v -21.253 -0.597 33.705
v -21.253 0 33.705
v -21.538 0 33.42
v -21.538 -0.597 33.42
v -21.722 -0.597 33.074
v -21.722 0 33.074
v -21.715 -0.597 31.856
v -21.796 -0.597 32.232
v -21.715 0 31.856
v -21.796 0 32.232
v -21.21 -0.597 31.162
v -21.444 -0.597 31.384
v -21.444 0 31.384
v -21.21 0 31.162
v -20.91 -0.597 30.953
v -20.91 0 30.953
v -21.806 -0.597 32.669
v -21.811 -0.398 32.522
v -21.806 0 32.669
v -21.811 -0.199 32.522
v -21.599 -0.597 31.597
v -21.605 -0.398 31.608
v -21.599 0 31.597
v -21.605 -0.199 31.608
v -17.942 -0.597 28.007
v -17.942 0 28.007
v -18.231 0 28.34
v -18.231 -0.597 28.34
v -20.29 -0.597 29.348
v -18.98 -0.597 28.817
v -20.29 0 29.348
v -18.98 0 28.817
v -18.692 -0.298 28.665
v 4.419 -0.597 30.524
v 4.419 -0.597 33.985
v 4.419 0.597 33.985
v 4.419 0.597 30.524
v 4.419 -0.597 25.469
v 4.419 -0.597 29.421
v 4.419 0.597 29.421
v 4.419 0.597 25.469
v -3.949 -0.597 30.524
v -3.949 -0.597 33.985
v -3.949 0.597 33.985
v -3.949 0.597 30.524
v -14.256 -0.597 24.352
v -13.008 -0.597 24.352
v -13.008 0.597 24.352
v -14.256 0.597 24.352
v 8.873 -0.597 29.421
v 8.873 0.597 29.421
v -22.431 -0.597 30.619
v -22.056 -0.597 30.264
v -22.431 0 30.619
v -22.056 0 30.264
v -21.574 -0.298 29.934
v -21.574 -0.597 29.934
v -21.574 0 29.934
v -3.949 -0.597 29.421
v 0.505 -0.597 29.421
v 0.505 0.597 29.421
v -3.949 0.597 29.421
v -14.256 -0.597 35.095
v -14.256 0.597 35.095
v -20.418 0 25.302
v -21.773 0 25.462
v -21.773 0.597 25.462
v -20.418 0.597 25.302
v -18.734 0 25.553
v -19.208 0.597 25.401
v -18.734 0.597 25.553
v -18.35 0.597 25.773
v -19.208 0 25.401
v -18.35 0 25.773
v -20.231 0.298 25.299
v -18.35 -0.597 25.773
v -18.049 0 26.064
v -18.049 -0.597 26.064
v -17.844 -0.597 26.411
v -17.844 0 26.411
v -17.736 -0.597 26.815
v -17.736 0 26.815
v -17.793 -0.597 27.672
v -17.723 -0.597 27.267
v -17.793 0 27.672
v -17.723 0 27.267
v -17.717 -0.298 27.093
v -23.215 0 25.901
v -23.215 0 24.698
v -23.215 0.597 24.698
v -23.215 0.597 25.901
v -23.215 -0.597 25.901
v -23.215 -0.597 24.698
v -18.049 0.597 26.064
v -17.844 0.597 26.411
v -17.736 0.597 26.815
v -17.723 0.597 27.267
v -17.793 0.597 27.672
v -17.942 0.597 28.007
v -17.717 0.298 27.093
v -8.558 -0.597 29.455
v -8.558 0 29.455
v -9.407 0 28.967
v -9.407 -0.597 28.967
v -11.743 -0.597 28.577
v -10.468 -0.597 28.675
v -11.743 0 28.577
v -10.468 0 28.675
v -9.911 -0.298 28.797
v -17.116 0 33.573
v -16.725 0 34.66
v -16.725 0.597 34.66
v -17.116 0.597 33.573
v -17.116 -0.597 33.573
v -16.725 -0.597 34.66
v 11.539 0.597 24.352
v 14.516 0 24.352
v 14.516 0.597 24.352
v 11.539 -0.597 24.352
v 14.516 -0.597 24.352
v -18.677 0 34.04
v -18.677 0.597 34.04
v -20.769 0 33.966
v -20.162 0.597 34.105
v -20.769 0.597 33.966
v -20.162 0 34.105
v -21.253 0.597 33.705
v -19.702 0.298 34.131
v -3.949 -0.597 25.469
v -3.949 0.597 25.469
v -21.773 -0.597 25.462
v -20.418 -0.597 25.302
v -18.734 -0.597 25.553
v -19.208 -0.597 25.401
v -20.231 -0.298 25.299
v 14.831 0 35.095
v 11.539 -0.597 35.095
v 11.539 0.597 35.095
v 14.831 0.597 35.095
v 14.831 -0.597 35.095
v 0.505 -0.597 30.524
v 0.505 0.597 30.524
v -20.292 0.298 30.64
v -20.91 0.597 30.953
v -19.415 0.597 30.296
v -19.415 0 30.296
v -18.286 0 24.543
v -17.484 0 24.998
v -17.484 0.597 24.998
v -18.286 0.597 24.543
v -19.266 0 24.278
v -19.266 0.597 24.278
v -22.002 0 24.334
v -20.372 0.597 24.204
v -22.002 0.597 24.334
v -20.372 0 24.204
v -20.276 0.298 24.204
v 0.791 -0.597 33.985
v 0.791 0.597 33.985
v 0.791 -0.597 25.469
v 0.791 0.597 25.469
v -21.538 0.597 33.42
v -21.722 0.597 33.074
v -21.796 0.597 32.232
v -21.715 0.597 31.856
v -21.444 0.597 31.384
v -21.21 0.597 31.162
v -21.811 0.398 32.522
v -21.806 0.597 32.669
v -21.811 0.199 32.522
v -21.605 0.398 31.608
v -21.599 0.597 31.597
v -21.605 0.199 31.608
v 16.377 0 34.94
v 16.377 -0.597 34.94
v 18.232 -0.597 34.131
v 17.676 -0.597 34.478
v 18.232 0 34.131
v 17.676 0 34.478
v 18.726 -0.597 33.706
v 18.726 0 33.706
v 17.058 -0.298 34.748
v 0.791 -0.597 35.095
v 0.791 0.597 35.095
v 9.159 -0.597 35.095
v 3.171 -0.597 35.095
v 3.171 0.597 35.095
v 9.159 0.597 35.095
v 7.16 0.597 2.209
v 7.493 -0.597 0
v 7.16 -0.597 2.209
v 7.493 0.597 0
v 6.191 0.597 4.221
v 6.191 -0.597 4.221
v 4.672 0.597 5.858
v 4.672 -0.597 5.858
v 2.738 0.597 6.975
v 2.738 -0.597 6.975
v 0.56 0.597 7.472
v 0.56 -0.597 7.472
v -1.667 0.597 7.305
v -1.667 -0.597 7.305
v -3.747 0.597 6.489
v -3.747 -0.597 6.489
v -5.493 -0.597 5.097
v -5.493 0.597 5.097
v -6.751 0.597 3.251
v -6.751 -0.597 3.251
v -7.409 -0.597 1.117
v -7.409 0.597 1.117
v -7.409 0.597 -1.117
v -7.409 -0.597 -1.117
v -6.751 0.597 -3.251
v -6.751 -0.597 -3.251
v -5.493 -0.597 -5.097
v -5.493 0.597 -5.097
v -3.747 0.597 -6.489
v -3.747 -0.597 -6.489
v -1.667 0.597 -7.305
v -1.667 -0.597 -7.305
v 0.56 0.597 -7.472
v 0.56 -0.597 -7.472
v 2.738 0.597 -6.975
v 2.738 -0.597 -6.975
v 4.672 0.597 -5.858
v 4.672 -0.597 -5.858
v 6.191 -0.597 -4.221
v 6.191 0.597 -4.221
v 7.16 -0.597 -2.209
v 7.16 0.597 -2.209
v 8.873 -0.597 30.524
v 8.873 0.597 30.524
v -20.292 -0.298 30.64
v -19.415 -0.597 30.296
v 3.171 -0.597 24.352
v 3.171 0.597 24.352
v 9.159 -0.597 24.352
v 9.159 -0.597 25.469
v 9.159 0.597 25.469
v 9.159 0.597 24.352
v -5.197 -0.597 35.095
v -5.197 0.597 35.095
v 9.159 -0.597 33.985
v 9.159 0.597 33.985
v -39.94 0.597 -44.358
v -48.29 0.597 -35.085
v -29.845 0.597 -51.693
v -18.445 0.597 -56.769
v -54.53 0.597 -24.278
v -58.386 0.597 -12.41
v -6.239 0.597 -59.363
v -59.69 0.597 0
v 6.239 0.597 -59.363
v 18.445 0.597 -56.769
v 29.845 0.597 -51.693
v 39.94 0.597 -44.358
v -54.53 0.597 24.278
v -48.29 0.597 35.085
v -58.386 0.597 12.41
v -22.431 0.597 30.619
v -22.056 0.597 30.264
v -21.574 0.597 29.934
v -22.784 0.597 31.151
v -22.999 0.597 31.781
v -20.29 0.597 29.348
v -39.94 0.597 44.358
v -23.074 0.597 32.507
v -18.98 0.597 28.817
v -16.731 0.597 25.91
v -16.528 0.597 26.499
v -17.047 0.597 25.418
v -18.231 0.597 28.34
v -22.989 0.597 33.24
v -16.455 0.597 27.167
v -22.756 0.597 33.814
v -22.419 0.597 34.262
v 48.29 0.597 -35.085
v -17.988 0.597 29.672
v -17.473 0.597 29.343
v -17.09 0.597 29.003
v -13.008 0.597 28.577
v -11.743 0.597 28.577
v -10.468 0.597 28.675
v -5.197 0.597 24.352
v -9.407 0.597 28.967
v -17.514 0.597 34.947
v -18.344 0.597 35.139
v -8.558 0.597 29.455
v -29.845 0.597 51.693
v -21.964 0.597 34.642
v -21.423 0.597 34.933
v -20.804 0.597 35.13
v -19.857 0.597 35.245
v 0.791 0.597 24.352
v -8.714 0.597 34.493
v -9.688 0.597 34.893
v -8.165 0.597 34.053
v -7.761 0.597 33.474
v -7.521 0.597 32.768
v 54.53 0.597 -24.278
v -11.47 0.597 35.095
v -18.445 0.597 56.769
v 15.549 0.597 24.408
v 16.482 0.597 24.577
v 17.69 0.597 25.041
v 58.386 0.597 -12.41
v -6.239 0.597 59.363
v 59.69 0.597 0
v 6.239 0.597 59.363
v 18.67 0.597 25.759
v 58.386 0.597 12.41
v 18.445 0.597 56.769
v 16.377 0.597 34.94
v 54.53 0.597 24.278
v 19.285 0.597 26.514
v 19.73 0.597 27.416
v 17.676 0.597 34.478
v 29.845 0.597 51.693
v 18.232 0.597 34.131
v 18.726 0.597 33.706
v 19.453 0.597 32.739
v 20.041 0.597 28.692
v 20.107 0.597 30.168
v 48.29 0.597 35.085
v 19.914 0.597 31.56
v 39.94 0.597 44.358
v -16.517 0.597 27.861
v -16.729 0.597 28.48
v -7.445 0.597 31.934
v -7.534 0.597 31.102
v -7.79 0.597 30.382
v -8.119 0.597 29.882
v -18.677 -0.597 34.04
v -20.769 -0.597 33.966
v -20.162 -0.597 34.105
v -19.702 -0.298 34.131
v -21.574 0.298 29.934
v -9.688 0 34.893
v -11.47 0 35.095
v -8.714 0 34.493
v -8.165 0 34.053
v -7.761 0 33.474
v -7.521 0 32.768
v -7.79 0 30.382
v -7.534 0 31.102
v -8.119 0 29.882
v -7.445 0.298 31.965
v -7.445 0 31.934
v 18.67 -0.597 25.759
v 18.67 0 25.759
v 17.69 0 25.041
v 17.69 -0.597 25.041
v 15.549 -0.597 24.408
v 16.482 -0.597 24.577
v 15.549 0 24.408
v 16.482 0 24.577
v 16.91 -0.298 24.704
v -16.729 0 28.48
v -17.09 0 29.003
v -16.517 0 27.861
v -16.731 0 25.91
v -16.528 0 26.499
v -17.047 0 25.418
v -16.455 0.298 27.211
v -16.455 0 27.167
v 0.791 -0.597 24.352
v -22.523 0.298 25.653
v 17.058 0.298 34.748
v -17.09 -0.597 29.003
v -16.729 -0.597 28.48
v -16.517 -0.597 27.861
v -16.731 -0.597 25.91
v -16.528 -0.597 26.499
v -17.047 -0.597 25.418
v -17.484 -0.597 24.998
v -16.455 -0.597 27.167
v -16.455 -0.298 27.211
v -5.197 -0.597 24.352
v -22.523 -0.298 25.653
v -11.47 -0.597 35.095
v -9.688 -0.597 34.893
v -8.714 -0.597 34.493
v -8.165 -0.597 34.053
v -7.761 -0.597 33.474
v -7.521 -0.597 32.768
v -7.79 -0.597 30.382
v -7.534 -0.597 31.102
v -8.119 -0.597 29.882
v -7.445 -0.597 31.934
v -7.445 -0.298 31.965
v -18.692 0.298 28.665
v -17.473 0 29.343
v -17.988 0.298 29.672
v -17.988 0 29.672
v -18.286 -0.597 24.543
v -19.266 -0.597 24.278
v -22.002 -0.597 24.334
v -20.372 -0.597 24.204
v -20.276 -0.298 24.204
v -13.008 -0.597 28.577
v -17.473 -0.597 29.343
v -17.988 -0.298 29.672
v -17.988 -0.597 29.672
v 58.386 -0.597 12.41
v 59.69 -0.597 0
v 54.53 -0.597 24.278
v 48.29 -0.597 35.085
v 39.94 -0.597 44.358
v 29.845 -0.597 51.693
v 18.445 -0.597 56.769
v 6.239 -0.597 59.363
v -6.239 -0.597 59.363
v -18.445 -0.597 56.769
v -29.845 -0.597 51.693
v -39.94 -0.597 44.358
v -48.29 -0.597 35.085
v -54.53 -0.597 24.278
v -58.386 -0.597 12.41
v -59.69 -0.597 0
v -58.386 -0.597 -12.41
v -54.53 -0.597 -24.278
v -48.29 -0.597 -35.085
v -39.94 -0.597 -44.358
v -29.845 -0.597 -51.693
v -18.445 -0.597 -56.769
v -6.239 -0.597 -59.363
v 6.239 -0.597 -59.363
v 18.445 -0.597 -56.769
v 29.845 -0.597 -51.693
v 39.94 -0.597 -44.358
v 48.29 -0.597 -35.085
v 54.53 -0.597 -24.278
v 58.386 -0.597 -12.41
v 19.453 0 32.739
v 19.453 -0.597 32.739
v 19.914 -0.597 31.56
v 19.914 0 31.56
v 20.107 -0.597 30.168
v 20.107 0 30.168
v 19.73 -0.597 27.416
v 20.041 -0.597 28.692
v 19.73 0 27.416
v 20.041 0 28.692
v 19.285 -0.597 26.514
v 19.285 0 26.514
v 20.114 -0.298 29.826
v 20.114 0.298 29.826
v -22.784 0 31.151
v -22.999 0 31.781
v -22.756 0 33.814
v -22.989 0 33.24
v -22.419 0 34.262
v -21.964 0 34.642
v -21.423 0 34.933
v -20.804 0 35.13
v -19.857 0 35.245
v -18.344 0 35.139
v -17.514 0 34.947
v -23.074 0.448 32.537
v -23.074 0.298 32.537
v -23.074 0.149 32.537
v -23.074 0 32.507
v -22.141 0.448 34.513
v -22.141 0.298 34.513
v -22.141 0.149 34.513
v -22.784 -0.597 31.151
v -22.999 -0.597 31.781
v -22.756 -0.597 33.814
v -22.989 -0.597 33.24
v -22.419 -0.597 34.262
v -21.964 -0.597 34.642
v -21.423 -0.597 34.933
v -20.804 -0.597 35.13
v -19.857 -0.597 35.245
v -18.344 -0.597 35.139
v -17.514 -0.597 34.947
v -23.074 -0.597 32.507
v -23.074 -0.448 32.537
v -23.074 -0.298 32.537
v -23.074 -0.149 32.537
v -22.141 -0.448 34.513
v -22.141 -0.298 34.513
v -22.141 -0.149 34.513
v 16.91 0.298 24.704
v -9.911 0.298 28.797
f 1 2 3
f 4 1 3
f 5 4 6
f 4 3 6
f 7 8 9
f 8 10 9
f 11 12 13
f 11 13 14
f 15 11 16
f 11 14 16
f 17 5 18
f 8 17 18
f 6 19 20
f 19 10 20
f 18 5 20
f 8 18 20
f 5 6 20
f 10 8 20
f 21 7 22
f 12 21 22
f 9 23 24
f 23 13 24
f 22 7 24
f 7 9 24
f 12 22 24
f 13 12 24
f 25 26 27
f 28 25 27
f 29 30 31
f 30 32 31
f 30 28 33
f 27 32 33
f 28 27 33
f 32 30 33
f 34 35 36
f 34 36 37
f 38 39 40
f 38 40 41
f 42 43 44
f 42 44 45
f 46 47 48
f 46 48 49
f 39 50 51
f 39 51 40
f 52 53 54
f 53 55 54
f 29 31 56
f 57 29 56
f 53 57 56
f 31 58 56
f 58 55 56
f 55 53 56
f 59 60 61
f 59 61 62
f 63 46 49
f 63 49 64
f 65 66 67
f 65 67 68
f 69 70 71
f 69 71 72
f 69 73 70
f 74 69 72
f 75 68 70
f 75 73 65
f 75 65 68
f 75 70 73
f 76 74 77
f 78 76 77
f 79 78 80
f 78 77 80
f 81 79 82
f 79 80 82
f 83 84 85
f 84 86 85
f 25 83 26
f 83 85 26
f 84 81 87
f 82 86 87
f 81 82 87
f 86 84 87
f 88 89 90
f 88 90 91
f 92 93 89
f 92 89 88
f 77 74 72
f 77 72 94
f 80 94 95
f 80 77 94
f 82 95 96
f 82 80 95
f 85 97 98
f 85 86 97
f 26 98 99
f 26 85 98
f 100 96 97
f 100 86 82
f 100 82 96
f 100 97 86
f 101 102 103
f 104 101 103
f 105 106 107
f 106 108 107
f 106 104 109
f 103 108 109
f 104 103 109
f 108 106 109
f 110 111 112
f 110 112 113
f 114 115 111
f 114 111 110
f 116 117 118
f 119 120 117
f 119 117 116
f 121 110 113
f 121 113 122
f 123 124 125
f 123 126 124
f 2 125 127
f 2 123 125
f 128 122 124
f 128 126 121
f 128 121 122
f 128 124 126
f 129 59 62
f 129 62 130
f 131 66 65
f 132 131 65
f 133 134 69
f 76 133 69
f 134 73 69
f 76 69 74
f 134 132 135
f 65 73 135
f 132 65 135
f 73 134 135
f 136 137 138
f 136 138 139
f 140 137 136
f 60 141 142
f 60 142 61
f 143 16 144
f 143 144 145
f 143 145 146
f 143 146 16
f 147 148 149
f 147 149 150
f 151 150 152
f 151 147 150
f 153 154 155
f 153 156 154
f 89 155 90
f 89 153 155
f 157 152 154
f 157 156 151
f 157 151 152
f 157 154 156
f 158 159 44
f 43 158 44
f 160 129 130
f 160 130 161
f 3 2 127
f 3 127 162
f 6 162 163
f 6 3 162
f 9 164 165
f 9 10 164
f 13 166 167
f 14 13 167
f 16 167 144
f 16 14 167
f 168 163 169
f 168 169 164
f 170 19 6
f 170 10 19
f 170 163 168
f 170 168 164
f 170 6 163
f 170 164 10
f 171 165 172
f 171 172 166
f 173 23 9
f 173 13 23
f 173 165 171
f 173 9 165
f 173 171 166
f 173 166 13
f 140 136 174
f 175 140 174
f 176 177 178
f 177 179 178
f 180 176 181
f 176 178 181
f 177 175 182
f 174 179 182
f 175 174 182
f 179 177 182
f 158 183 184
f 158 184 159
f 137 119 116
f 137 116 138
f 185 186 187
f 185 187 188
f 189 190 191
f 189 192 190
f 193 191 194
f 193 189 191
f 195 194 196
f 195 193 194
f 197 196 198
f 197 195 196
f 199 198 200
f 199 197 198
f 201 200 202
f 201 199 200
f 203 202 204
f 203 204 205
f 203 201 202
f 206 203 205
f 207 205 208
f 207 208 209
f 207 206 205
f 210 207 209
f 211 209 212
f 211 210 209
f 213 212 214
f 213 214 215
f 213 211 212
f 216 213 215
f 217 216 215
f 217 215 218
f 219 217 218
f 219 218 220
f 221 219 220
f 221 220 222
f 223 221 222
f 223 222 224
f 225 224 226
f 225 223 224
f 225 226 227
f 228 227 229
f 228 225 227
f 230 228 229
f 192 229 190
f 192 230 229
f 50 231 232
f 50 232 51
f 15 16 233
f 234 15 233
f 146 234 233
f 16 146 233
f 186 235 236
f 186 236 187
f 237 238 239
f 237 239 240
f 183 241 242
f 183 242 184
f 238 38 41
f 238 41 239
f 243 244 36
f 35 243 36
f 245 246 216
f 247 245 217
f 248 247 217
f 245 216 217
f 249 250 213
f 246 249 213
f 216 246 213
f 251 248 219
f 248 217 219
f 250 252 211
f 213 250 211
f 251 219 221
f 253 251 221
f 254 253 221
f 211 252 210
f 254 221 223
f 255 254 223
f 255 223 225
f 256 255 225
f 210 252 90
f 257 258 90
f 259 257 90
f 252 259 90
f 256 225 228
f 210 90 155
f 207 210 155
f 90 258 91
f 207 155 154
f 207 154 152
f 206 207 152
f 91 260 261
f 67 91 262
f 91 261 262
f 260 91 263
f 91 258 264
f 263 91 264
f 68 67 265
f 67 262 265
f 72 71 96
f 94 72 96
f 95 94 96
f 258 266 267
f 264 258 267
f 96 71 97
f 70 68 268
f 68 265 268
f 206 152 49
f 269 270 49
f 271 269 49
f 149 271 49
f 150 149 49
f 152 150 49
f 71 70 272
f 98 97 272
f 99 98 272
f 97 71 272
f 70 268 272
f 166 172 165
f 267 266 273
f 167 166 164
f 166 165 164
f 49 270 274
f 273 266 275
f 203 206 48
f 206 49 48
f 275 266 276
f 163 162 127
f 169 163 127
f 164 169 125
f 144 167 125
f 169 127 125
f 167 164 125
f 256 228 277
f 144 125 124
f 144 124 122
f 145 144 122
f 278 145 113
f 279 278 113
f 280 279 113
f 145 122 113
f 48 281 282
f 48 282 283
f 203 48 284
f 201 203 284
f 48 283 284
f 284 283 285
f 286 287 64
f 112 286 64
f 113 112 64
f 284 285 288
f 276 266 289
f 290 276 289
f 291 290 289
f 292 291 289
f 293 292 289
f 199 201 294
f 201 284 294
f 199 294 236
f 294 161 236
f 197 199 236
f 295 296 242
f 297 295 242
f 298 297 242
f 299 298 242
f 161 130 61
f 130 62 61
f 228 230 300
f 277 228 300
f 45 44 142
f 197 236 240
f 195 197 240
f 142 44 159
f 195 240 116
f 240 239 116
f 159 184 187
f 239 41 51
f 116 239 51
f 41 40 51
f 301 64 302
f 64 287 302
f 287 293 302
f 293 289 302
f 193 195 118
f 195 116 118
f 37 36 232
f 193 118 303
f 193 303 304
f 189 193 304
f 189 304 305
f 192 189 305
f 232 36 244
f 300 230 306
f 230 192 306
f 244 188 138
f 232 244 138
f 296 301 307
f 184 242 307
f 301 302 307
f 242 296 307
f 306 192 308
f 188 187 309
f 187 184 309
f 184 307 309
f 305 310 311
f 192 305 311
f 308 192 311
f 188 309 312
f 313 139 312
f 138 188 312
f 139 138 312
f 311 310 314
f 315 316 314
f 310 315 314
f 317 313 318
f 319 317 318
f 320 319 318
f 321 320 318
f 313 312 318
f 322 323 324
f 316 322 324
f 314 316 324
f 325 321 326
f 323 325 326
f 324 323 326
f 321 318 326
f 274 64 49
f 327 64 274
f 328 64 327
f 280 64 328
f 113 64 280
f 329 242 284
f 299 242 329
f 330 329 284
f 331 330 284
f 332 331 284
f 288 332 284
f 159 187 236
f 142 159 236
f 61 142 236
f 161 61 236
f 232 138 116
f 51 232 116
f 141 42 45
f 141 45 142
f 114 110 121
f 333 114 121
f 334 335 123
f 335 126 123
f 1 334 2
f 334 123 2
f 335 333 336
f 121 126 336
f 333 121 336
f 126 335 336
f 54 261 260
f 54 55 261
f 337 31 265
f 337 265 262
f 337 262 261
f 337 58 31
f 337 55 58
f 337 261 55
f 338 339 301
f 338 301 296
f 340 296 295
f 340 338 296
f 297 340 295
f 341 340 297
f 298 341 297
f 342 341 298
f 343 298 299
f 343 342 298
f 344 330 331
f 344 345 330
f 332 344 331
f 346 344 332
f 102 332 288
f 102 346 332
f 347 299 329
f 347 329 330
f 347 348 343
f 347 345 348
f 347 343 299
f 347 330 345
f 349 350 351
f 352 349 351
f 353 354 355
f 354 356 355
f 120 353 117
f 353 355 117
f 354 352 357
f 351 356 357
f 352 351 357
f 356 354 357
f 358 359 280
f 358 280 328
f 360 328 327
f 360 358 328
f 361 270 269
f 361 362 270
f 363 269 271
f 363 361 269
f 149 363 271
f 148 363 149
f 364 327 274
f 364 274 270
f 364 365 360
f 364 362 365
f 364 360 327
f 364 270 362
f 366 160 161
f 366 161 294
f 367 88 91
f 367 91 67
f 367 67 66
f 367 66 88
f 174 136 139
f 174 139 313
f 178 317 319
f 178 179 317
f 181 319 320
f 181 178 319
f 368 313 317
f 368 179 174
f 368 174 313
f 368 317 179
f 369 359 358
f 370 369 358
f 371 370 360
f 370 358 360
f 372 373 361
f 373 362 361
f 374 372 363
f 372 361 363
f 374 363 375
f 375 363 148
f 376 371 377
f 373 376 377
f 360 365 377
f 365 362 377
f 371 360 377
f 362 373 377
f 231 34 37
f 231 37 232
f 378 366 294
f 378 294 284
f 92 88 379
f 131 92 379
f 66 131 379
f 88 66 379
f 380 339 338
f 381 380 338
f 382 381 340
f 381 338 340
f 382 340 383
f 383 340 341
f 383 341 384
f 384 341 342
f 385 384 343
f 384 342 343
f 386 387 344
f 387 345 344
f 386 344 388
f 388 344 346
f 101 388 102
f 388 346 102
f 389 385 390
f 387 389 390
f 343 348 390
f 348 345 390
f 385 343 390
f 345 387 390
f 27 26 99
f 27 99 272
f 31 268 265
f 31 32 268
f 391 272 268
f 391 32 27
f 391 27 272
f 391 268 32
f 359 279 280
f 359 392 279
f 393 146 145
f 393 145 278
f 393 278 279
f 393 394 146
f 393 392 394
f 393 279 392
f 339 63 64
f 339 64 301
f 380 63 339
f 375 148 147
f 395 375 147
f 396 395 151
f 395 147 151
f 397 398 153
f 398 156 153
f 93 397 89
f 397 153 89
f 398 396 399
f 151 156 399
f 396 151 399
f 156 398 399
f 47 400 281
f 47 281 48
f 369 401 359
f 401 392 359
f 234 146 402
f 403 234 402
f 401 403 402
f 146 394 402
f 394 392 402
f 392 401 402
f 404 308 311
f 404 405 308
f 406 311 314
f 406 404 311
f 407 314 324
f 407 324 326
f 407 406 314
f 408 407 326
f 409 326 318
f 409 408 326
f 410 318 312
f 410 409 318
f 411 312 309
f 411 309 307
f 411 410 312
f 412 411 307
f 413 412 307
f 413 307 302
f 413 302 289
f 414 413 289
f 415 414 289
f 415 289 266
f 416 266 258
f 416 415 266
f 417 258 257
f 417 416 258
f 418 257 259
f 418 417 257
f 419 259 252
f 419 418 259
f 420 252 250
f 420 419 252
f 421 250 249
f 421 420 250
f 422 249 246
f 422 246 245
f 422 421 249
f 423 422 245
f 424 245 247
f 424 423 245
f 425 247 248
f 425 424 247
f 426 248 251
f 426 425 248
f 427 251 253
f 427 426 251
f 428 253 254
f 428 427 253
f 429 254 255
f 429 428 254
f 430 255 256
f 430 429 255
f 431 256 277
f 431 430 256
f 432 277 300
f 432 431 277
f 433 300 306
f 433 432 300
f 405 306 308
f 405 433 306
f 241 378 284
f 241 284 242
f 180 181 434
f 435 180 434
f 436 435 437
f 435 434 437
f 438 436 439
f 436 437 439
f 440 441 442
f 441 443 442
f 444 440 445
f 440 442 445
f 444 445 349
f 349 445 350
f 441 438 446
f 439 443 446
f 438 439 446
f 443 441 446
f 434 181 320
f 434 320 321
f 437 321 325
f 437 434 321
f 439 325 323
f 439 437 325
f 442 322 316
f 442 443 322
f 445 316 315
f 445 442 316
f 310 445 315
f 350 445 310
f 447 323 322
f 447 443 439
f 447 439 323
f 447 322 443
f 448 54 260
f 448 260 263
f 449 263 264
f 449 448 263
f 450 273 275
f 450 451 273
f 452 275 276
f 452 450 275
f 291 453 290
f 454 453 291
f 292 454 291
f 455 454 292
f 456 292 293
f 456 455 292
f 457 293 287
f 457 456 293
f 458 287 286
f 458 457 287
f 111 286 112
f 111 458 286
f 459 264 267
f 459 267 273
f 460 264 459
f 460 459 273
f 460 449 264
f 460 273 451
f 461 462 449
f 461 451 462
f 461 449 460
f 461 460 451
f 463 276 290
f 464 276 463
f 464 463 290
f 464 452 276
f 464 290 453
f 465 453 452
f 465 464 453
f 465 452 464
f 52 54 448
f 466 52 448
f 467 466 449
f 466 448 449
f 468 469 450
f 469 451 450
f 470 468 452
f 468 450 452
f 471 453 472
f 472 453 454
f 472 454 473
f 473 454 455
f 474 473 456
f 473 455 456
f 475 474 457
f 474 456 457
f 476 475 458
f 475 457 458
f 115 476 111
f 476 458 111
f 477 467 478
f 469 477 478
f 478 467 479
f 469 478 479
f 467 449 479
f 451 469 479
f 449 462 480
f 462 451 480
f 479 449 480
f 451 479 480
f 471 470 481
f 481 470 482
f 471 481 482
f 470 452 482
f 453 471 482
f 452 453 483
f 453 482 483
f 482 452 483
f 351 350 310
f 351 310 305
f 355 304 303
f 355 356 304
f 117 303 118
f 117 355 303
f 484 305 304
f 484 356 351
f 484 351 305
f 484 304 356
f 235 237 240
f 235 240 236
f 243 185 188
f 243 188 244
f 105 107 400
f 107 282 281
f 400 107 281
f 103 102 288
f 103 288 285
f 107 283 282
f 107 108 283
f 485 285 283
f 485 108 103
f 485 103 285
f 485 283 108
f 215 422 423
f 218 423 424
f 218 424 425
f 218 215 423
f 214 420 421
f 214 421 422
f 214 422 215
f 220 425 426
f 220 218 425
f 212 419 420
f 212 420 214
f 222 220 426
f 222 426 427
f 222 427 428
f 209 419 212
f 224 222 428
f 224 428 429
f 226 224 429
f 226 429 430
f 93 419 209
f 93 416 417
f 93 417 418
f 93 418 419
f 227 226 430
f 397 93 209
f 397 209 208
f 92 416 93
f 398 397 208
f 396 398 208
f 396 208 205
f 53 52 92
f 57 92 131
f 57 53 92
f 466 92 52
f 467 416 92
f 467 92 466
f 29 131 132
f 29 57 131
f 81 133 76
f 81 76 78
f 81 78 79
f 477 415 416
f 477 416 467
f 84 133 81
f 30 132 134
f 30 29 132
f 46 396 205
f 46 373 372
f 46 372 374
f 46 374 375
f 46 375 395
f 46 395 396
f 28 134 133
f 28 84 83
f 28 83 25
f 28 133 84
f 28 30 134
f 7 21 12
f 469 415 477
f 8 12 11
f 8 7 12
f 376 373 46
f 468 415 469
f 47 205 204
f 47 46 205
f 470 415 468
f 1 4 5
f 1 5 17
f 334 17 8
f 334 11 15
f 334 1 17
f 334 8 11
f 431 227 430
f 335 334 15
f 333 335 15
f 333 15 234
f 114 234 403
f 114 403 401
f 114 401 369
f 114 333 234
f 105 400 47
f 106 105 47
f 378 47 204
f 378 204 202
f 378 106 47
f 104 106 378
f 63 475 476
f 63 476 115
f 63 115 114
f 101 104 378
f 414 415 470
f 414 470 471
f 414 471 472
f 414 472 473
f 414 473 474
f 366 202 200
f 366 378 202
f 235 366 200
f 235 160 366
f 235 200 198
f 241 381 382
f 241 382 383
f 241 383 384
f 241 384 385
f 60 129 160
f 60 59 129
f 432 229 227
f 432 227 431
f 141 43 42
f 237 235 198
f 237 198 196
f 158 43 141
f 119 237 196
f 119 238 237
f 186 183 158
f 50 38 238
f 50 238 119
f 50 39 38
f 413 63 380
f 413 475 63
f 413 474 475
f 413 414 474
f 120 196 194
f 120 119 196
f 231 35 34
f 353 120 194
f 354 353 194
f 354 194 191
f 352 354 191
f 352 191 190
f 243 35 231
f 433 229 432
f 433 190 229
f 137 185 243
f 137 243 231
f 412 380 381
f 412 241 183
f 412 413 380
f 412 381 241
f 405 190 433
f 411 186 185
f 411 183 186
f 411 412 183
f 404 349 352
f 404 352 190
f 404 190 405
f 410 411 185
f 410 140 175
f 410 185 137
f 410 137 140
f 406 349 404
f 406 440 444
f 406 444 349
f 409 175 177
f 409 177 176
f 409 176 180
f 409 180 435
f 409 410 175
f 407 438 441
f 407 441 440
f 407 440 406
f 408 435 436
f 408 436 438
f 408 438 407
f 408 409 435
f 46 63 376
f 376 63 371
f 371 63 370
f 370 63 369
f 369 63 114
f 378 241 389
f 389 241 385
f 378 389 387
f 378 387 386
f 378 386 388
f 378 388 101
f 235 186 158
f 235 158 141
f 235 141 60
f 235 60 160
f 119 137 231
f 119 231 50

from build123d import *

# Parameters (mm, degrees)
F0_R     = 59.69
F0_R_2   = 7.493
F1_DEPTH = 0.5969


with BuildPart() as f1:
    # F0 (on Front) → F1 (new body, symmetric)
    with BuildSketch(Plane.XZ):
        Circle(F0_R)
        with BuildLine():
            add(Edge.make_bspline(
                [(-17.0897103089, 29.0026352959), (-16.4548764224, 28.3113717305), (-16.4548764224, 27.2109929938)],
                knots=[0, 0, 0, 1, 1, 1], degree=2))
            add(Edge.make_bspline(
                [(-16.4548764224, 27.2109929938), (-16.4548764224, 25.7931973138), (-17.4835424423, 24.9984793372)],
                knots=[0, 0, 0, 1, 1, 1], degree=2))
            add(Edge.make_bspline(
                [(-17.4835424423, 24.9984793372), (-18.5122084622, 24.2037613607), (-20.2756359249, 24.2037613607)],
                knots=[0, 0, 0, 1, 1, 1], degree=2))
            add(Edge.make_bspline(
                [(-20.2756359249, 24.2037613607), (-22.1848400579, 24.2037613607), (-23.2146816961, 24.6975210503)],
                knots=[0, 0, 0, 1, 1, 1], degree=2))
            Line((-23.2146816961, 24.6975210503), (-23.2146816961, 25.9013541981))
            add(Edge.make_bspline(
                [(-23.2146816961, 25.9013541981), (-22.5516329701, 25.6239082773), (-21.7733736499, 25.4616729508)],
                knots=[0, 0, 0, 1, 1, 1], degree=2))
            add(Edge.make_bspline(
                [(-21.7733736499, 25.4616729508), (-20.9951143297, 25.2994376242), (-20.2309624292, 25.2994376242)],
                knots=[0, 0, 0, 1, 1, 1], degree=2))
            add(Edge.make_bspline(
                [(-20.2309624292, 25.2994376242), (-18.9824557856, 25.2994376242), (-18.3499731356, 25.7732118025)],
                knots=[0, 0, 0, 1, 1, 1], degree=2))
            add(Edge.make_bspline(
                [(-18.3499731356, 25.7732118025), (-17.7174904857, 26.2469859808), (-17.7174904857, 27.0934311629)],
                knots=[0, 0, 0, 1, 1, 1], degree=2))
            add(Edge.make_bspline(
                [(-17.7174904857, 27.0934311629), (-17.7174904857, 27.6506742412), (-17.9420335826, 28.0068865886)],
                knots=[0, 0, 0, 1, 1, 1], degree=2))
            add(Edge.make_bspline(
                [(-17.9420335826, 28.0068865886), (-18.1665766795, 28.3630989361), (-18.6920780634, 28.6652328414)],
                knots=[0, 0, 0, 1, 1, 1], degree=2))
            add(Edge.make_bspline(
                [(-18.6920780634, 28.6652328414), (-19.2175794473, 28.9673667467), (-20.2897433446, 29.3482670786)],
                knots=[0, 0, 0, 1, 1, 1], degree=2))
            add(Edge.make_bspline(
                [(-20.2897433446, 29.3482670786), (-21.7874810696, 29.8843490273), (-22.4305442844, 30.6191104701)],
                knots=[0, 0, 0, 1, 1, 1], degree=2))
            add(Edge.make_bspline(
                [(-22.4305442844, 30.6191104701), (-23.0736074991, 31.3538719129), (-23.0736074991, 32.5365439312)],
                knots=[0, 0, 0, 1, 1, 1], degree=2))
            add(Edge.make_bspline(
                [(-23.0736074991, 32.5365439312), (-23.0736074991, 33.777996865), (-22.1413421805, 34.5127583078)],
                knots=[0, 0, 0, 1, 1, 1], degree=2))
            add(Edge.make_bspline(
                [(-22.1413421805, 34.5127583078), (-21.2090768619, 35.2475197506), (-19.6713681144, 35.2475197506)],
                knots=[0, 0, 0, 1, 1, 1], degree=2))
            add(Edge.make_bspline(
                [(-19.6713681144, 35.2475197506), (-18.0701759782, 35.2475197506), (-16.7252686333, 34.6597105963)],
                knots=[0, 0, 0, 1, 1, 1], degree=2))
            Line((-16.7252686333, 34.6597105963), (-17.1155739117, 33.5734392793))
            add(Edge.make_bspline(
                [(-17.1155739117, 33.5734392793), (-18.4463738369, 34.1306823575), (-19.7019341904, 34.1306823575)],
                knots=[0, 0, 0, 1, 1, 1], degree=2))
            add(Edge.make_bspline(
                [(-19.7019341904, 34.1306823575), (-20.6941560427, 34.1306823575), (-21.2525747393, 33.7051085298)],
                knots=[0, 0, 0, 1, 1, 1], degree=2))
            add(Edge.make_bspline(
                [(-21.2525747393, 33.7051085298), (-21.8109934358, 33.2795347022), (-21.8109934358, 32.5224365115)],
                knots=[0, 0, 0, 1, 1, 1], degree=2))
            add(Edge.make_bspline(
                [(-21.8109934358, 32.5224365115), (-21.8109934358, 31.9651934333), (-21.6052602318, 31.6078054675)],
                knots=[0, 0, 0, 1, 1, 1], degree=2))
            add(Edge.make_bspline(
                [(-21.6052602318, 31.6078054675), (-21.3995270278, 31.2504175017), (-20.9104698115, 30.9529860697)],
                knots=[0, 0, 0, 1, 1, 1], degree=2))
            add(Edge.make_bspline(
                [(-20.9104698115, 30.9529860697), (-20.4214125952, 30.6555546376), (-19.4150833231, 30.2958154352)],
                knots=[0, 0, 0, 1, 1, 1], degree=2))
            add(Edge.make_bspline(
                [(-19.4150833231, 30.2958154352), (-17.7245441955, 29.6938988613), (-17.0897103089, 29.0026352959)],
                knots=[0, 0, 0, 1, 1, 1], degree=2))
        make_face(mode=Mode.SUBTRACT)
        with BuildLine():
            add(Edge.make_bspline(
                [(-11.4702547944, 35.0946893705), (-7.4449377062, 35.0946893705), (-7.4449377062, 31.9651934333)],
                knots=[0, 0, 0, 1, 1, 1], degree=2))
            add(Edge.make_bspline(
                [(-7.4449377062, 31.9651934333), (-7.4449377062, 30.3334352211), (-8.5582482443, 29.4552483447)],
                knots=[0, 0, 0, 1, 1, 1], degree=2))
            add(Edge.make_bspline(
                [(-8.5582482443, 29.4552483447), (-9.6715587824, 28.5770614682), (-11.742998242, 28.5770614682)],
                knots=[0, 0, 0, 1, 1, 1], degree=2))
            Line((-11.742998242, 28.5770614682), (-13.0079635419, 28.5770614682))
            Line((-13.0079635419, 28.5770614682), (-13.0079635419, 24.3518892676))
            Line((-13.0079635419, 24.3518892676), (-14.2564701855, 24.3518892676))
            Line((-14.2564701855, 24.3518892676), (-14.2564701855, 35.0946893705))
            Line((-14.2564701855, 35.0946893705), (-11.4702547944, 35.0946893705))
        make_face(mode=Mode.SUBTRACT)
        Polygon((0.791444163, 25.4687266606), (0.791444163, 24.3518892676), (-5.1971555004, 24.3518892676), (-5.1971555004, 35.0946893705), (0.791444163, 35.0946893705), (0.791444163, 33.9849056872), (-3.9486488567, 33.9849056872), (-3.9486488567, 30.5238853871), (0.5045932958, 30.5238853871), (0.5045932958, 29.4211554137), (-3.9486488567, 29.4211554137), (-3.9486488567, 25.4687266606), align=None, mode=Mode.SUBTRACT)
        Circle(F0_R_2, mode=Mode.SUBTRACT)
        Polygon((9.1594952828, 25.4687266606), (9.1594952828, 24.3518892676), (3.1708956194, 24.3518892676), (3.1708956194, 35.0946893705), (9.1594952828, 35.0946893705), (9.1594952828, 33.9849056872), (4.419402263, 33.9849056872), (4.419402263, 30.5238853871), (8.8726444155, 30.5238853871), (8.8726444155, 29.4211554137), (4.419402263, 29.4211554137), (4.419402263, 25.4687266606), align=None, mode=Mode.SUBTRACT)
        with BuildLine():
            add(Edge.make_bspline(
                [(18.7255014589, 33.7062841481), (20.1139066812, 32.3178789258), (20.1139066812, 29.8255681118)],
                knots=[0, 0, 0, 1, 1, 1], degree=2))
            add(Edge.make_bspline(
                [(20.1139066812, 29.8255681118), (20.1139066812, 27.1663194981), (18.6702473984, 25.7591043828)],
                knots=[0, 0, 0, 1, 1, 1], degree=2))
            add(Edge.make_bspline(
                [(18.6702473984, 25.7591043828), (17.2265881156, 24.3518892676), (14.5156122962, 24.3518892676)],
                knots=[0, 0, 0, 1, 1, 1], degree=2))
            Line((14.5156122962, 24.3518892676), (11.5389467392, 24.3518892676))
            Line((11.5389467392, 24.3518892676), (11.5389467392, 35.0946893705))
            Line((11.5389467392, 35.0946893705), (14.8306780029, 35.0946893705))
            add(Edge.make_bspline(
                [(14.8306780029, 35.0946893705), (17.3370962366, 35.0946893705), (18.7255014589, 33.7062841481)],
                knots=[0, 0, 0, 1, 1, 1], degree=2))
        make_face(mode=Mode.SUBTRACT)
    extrude(amount=F1_DEPTH, both=True)


solid = f1.part
